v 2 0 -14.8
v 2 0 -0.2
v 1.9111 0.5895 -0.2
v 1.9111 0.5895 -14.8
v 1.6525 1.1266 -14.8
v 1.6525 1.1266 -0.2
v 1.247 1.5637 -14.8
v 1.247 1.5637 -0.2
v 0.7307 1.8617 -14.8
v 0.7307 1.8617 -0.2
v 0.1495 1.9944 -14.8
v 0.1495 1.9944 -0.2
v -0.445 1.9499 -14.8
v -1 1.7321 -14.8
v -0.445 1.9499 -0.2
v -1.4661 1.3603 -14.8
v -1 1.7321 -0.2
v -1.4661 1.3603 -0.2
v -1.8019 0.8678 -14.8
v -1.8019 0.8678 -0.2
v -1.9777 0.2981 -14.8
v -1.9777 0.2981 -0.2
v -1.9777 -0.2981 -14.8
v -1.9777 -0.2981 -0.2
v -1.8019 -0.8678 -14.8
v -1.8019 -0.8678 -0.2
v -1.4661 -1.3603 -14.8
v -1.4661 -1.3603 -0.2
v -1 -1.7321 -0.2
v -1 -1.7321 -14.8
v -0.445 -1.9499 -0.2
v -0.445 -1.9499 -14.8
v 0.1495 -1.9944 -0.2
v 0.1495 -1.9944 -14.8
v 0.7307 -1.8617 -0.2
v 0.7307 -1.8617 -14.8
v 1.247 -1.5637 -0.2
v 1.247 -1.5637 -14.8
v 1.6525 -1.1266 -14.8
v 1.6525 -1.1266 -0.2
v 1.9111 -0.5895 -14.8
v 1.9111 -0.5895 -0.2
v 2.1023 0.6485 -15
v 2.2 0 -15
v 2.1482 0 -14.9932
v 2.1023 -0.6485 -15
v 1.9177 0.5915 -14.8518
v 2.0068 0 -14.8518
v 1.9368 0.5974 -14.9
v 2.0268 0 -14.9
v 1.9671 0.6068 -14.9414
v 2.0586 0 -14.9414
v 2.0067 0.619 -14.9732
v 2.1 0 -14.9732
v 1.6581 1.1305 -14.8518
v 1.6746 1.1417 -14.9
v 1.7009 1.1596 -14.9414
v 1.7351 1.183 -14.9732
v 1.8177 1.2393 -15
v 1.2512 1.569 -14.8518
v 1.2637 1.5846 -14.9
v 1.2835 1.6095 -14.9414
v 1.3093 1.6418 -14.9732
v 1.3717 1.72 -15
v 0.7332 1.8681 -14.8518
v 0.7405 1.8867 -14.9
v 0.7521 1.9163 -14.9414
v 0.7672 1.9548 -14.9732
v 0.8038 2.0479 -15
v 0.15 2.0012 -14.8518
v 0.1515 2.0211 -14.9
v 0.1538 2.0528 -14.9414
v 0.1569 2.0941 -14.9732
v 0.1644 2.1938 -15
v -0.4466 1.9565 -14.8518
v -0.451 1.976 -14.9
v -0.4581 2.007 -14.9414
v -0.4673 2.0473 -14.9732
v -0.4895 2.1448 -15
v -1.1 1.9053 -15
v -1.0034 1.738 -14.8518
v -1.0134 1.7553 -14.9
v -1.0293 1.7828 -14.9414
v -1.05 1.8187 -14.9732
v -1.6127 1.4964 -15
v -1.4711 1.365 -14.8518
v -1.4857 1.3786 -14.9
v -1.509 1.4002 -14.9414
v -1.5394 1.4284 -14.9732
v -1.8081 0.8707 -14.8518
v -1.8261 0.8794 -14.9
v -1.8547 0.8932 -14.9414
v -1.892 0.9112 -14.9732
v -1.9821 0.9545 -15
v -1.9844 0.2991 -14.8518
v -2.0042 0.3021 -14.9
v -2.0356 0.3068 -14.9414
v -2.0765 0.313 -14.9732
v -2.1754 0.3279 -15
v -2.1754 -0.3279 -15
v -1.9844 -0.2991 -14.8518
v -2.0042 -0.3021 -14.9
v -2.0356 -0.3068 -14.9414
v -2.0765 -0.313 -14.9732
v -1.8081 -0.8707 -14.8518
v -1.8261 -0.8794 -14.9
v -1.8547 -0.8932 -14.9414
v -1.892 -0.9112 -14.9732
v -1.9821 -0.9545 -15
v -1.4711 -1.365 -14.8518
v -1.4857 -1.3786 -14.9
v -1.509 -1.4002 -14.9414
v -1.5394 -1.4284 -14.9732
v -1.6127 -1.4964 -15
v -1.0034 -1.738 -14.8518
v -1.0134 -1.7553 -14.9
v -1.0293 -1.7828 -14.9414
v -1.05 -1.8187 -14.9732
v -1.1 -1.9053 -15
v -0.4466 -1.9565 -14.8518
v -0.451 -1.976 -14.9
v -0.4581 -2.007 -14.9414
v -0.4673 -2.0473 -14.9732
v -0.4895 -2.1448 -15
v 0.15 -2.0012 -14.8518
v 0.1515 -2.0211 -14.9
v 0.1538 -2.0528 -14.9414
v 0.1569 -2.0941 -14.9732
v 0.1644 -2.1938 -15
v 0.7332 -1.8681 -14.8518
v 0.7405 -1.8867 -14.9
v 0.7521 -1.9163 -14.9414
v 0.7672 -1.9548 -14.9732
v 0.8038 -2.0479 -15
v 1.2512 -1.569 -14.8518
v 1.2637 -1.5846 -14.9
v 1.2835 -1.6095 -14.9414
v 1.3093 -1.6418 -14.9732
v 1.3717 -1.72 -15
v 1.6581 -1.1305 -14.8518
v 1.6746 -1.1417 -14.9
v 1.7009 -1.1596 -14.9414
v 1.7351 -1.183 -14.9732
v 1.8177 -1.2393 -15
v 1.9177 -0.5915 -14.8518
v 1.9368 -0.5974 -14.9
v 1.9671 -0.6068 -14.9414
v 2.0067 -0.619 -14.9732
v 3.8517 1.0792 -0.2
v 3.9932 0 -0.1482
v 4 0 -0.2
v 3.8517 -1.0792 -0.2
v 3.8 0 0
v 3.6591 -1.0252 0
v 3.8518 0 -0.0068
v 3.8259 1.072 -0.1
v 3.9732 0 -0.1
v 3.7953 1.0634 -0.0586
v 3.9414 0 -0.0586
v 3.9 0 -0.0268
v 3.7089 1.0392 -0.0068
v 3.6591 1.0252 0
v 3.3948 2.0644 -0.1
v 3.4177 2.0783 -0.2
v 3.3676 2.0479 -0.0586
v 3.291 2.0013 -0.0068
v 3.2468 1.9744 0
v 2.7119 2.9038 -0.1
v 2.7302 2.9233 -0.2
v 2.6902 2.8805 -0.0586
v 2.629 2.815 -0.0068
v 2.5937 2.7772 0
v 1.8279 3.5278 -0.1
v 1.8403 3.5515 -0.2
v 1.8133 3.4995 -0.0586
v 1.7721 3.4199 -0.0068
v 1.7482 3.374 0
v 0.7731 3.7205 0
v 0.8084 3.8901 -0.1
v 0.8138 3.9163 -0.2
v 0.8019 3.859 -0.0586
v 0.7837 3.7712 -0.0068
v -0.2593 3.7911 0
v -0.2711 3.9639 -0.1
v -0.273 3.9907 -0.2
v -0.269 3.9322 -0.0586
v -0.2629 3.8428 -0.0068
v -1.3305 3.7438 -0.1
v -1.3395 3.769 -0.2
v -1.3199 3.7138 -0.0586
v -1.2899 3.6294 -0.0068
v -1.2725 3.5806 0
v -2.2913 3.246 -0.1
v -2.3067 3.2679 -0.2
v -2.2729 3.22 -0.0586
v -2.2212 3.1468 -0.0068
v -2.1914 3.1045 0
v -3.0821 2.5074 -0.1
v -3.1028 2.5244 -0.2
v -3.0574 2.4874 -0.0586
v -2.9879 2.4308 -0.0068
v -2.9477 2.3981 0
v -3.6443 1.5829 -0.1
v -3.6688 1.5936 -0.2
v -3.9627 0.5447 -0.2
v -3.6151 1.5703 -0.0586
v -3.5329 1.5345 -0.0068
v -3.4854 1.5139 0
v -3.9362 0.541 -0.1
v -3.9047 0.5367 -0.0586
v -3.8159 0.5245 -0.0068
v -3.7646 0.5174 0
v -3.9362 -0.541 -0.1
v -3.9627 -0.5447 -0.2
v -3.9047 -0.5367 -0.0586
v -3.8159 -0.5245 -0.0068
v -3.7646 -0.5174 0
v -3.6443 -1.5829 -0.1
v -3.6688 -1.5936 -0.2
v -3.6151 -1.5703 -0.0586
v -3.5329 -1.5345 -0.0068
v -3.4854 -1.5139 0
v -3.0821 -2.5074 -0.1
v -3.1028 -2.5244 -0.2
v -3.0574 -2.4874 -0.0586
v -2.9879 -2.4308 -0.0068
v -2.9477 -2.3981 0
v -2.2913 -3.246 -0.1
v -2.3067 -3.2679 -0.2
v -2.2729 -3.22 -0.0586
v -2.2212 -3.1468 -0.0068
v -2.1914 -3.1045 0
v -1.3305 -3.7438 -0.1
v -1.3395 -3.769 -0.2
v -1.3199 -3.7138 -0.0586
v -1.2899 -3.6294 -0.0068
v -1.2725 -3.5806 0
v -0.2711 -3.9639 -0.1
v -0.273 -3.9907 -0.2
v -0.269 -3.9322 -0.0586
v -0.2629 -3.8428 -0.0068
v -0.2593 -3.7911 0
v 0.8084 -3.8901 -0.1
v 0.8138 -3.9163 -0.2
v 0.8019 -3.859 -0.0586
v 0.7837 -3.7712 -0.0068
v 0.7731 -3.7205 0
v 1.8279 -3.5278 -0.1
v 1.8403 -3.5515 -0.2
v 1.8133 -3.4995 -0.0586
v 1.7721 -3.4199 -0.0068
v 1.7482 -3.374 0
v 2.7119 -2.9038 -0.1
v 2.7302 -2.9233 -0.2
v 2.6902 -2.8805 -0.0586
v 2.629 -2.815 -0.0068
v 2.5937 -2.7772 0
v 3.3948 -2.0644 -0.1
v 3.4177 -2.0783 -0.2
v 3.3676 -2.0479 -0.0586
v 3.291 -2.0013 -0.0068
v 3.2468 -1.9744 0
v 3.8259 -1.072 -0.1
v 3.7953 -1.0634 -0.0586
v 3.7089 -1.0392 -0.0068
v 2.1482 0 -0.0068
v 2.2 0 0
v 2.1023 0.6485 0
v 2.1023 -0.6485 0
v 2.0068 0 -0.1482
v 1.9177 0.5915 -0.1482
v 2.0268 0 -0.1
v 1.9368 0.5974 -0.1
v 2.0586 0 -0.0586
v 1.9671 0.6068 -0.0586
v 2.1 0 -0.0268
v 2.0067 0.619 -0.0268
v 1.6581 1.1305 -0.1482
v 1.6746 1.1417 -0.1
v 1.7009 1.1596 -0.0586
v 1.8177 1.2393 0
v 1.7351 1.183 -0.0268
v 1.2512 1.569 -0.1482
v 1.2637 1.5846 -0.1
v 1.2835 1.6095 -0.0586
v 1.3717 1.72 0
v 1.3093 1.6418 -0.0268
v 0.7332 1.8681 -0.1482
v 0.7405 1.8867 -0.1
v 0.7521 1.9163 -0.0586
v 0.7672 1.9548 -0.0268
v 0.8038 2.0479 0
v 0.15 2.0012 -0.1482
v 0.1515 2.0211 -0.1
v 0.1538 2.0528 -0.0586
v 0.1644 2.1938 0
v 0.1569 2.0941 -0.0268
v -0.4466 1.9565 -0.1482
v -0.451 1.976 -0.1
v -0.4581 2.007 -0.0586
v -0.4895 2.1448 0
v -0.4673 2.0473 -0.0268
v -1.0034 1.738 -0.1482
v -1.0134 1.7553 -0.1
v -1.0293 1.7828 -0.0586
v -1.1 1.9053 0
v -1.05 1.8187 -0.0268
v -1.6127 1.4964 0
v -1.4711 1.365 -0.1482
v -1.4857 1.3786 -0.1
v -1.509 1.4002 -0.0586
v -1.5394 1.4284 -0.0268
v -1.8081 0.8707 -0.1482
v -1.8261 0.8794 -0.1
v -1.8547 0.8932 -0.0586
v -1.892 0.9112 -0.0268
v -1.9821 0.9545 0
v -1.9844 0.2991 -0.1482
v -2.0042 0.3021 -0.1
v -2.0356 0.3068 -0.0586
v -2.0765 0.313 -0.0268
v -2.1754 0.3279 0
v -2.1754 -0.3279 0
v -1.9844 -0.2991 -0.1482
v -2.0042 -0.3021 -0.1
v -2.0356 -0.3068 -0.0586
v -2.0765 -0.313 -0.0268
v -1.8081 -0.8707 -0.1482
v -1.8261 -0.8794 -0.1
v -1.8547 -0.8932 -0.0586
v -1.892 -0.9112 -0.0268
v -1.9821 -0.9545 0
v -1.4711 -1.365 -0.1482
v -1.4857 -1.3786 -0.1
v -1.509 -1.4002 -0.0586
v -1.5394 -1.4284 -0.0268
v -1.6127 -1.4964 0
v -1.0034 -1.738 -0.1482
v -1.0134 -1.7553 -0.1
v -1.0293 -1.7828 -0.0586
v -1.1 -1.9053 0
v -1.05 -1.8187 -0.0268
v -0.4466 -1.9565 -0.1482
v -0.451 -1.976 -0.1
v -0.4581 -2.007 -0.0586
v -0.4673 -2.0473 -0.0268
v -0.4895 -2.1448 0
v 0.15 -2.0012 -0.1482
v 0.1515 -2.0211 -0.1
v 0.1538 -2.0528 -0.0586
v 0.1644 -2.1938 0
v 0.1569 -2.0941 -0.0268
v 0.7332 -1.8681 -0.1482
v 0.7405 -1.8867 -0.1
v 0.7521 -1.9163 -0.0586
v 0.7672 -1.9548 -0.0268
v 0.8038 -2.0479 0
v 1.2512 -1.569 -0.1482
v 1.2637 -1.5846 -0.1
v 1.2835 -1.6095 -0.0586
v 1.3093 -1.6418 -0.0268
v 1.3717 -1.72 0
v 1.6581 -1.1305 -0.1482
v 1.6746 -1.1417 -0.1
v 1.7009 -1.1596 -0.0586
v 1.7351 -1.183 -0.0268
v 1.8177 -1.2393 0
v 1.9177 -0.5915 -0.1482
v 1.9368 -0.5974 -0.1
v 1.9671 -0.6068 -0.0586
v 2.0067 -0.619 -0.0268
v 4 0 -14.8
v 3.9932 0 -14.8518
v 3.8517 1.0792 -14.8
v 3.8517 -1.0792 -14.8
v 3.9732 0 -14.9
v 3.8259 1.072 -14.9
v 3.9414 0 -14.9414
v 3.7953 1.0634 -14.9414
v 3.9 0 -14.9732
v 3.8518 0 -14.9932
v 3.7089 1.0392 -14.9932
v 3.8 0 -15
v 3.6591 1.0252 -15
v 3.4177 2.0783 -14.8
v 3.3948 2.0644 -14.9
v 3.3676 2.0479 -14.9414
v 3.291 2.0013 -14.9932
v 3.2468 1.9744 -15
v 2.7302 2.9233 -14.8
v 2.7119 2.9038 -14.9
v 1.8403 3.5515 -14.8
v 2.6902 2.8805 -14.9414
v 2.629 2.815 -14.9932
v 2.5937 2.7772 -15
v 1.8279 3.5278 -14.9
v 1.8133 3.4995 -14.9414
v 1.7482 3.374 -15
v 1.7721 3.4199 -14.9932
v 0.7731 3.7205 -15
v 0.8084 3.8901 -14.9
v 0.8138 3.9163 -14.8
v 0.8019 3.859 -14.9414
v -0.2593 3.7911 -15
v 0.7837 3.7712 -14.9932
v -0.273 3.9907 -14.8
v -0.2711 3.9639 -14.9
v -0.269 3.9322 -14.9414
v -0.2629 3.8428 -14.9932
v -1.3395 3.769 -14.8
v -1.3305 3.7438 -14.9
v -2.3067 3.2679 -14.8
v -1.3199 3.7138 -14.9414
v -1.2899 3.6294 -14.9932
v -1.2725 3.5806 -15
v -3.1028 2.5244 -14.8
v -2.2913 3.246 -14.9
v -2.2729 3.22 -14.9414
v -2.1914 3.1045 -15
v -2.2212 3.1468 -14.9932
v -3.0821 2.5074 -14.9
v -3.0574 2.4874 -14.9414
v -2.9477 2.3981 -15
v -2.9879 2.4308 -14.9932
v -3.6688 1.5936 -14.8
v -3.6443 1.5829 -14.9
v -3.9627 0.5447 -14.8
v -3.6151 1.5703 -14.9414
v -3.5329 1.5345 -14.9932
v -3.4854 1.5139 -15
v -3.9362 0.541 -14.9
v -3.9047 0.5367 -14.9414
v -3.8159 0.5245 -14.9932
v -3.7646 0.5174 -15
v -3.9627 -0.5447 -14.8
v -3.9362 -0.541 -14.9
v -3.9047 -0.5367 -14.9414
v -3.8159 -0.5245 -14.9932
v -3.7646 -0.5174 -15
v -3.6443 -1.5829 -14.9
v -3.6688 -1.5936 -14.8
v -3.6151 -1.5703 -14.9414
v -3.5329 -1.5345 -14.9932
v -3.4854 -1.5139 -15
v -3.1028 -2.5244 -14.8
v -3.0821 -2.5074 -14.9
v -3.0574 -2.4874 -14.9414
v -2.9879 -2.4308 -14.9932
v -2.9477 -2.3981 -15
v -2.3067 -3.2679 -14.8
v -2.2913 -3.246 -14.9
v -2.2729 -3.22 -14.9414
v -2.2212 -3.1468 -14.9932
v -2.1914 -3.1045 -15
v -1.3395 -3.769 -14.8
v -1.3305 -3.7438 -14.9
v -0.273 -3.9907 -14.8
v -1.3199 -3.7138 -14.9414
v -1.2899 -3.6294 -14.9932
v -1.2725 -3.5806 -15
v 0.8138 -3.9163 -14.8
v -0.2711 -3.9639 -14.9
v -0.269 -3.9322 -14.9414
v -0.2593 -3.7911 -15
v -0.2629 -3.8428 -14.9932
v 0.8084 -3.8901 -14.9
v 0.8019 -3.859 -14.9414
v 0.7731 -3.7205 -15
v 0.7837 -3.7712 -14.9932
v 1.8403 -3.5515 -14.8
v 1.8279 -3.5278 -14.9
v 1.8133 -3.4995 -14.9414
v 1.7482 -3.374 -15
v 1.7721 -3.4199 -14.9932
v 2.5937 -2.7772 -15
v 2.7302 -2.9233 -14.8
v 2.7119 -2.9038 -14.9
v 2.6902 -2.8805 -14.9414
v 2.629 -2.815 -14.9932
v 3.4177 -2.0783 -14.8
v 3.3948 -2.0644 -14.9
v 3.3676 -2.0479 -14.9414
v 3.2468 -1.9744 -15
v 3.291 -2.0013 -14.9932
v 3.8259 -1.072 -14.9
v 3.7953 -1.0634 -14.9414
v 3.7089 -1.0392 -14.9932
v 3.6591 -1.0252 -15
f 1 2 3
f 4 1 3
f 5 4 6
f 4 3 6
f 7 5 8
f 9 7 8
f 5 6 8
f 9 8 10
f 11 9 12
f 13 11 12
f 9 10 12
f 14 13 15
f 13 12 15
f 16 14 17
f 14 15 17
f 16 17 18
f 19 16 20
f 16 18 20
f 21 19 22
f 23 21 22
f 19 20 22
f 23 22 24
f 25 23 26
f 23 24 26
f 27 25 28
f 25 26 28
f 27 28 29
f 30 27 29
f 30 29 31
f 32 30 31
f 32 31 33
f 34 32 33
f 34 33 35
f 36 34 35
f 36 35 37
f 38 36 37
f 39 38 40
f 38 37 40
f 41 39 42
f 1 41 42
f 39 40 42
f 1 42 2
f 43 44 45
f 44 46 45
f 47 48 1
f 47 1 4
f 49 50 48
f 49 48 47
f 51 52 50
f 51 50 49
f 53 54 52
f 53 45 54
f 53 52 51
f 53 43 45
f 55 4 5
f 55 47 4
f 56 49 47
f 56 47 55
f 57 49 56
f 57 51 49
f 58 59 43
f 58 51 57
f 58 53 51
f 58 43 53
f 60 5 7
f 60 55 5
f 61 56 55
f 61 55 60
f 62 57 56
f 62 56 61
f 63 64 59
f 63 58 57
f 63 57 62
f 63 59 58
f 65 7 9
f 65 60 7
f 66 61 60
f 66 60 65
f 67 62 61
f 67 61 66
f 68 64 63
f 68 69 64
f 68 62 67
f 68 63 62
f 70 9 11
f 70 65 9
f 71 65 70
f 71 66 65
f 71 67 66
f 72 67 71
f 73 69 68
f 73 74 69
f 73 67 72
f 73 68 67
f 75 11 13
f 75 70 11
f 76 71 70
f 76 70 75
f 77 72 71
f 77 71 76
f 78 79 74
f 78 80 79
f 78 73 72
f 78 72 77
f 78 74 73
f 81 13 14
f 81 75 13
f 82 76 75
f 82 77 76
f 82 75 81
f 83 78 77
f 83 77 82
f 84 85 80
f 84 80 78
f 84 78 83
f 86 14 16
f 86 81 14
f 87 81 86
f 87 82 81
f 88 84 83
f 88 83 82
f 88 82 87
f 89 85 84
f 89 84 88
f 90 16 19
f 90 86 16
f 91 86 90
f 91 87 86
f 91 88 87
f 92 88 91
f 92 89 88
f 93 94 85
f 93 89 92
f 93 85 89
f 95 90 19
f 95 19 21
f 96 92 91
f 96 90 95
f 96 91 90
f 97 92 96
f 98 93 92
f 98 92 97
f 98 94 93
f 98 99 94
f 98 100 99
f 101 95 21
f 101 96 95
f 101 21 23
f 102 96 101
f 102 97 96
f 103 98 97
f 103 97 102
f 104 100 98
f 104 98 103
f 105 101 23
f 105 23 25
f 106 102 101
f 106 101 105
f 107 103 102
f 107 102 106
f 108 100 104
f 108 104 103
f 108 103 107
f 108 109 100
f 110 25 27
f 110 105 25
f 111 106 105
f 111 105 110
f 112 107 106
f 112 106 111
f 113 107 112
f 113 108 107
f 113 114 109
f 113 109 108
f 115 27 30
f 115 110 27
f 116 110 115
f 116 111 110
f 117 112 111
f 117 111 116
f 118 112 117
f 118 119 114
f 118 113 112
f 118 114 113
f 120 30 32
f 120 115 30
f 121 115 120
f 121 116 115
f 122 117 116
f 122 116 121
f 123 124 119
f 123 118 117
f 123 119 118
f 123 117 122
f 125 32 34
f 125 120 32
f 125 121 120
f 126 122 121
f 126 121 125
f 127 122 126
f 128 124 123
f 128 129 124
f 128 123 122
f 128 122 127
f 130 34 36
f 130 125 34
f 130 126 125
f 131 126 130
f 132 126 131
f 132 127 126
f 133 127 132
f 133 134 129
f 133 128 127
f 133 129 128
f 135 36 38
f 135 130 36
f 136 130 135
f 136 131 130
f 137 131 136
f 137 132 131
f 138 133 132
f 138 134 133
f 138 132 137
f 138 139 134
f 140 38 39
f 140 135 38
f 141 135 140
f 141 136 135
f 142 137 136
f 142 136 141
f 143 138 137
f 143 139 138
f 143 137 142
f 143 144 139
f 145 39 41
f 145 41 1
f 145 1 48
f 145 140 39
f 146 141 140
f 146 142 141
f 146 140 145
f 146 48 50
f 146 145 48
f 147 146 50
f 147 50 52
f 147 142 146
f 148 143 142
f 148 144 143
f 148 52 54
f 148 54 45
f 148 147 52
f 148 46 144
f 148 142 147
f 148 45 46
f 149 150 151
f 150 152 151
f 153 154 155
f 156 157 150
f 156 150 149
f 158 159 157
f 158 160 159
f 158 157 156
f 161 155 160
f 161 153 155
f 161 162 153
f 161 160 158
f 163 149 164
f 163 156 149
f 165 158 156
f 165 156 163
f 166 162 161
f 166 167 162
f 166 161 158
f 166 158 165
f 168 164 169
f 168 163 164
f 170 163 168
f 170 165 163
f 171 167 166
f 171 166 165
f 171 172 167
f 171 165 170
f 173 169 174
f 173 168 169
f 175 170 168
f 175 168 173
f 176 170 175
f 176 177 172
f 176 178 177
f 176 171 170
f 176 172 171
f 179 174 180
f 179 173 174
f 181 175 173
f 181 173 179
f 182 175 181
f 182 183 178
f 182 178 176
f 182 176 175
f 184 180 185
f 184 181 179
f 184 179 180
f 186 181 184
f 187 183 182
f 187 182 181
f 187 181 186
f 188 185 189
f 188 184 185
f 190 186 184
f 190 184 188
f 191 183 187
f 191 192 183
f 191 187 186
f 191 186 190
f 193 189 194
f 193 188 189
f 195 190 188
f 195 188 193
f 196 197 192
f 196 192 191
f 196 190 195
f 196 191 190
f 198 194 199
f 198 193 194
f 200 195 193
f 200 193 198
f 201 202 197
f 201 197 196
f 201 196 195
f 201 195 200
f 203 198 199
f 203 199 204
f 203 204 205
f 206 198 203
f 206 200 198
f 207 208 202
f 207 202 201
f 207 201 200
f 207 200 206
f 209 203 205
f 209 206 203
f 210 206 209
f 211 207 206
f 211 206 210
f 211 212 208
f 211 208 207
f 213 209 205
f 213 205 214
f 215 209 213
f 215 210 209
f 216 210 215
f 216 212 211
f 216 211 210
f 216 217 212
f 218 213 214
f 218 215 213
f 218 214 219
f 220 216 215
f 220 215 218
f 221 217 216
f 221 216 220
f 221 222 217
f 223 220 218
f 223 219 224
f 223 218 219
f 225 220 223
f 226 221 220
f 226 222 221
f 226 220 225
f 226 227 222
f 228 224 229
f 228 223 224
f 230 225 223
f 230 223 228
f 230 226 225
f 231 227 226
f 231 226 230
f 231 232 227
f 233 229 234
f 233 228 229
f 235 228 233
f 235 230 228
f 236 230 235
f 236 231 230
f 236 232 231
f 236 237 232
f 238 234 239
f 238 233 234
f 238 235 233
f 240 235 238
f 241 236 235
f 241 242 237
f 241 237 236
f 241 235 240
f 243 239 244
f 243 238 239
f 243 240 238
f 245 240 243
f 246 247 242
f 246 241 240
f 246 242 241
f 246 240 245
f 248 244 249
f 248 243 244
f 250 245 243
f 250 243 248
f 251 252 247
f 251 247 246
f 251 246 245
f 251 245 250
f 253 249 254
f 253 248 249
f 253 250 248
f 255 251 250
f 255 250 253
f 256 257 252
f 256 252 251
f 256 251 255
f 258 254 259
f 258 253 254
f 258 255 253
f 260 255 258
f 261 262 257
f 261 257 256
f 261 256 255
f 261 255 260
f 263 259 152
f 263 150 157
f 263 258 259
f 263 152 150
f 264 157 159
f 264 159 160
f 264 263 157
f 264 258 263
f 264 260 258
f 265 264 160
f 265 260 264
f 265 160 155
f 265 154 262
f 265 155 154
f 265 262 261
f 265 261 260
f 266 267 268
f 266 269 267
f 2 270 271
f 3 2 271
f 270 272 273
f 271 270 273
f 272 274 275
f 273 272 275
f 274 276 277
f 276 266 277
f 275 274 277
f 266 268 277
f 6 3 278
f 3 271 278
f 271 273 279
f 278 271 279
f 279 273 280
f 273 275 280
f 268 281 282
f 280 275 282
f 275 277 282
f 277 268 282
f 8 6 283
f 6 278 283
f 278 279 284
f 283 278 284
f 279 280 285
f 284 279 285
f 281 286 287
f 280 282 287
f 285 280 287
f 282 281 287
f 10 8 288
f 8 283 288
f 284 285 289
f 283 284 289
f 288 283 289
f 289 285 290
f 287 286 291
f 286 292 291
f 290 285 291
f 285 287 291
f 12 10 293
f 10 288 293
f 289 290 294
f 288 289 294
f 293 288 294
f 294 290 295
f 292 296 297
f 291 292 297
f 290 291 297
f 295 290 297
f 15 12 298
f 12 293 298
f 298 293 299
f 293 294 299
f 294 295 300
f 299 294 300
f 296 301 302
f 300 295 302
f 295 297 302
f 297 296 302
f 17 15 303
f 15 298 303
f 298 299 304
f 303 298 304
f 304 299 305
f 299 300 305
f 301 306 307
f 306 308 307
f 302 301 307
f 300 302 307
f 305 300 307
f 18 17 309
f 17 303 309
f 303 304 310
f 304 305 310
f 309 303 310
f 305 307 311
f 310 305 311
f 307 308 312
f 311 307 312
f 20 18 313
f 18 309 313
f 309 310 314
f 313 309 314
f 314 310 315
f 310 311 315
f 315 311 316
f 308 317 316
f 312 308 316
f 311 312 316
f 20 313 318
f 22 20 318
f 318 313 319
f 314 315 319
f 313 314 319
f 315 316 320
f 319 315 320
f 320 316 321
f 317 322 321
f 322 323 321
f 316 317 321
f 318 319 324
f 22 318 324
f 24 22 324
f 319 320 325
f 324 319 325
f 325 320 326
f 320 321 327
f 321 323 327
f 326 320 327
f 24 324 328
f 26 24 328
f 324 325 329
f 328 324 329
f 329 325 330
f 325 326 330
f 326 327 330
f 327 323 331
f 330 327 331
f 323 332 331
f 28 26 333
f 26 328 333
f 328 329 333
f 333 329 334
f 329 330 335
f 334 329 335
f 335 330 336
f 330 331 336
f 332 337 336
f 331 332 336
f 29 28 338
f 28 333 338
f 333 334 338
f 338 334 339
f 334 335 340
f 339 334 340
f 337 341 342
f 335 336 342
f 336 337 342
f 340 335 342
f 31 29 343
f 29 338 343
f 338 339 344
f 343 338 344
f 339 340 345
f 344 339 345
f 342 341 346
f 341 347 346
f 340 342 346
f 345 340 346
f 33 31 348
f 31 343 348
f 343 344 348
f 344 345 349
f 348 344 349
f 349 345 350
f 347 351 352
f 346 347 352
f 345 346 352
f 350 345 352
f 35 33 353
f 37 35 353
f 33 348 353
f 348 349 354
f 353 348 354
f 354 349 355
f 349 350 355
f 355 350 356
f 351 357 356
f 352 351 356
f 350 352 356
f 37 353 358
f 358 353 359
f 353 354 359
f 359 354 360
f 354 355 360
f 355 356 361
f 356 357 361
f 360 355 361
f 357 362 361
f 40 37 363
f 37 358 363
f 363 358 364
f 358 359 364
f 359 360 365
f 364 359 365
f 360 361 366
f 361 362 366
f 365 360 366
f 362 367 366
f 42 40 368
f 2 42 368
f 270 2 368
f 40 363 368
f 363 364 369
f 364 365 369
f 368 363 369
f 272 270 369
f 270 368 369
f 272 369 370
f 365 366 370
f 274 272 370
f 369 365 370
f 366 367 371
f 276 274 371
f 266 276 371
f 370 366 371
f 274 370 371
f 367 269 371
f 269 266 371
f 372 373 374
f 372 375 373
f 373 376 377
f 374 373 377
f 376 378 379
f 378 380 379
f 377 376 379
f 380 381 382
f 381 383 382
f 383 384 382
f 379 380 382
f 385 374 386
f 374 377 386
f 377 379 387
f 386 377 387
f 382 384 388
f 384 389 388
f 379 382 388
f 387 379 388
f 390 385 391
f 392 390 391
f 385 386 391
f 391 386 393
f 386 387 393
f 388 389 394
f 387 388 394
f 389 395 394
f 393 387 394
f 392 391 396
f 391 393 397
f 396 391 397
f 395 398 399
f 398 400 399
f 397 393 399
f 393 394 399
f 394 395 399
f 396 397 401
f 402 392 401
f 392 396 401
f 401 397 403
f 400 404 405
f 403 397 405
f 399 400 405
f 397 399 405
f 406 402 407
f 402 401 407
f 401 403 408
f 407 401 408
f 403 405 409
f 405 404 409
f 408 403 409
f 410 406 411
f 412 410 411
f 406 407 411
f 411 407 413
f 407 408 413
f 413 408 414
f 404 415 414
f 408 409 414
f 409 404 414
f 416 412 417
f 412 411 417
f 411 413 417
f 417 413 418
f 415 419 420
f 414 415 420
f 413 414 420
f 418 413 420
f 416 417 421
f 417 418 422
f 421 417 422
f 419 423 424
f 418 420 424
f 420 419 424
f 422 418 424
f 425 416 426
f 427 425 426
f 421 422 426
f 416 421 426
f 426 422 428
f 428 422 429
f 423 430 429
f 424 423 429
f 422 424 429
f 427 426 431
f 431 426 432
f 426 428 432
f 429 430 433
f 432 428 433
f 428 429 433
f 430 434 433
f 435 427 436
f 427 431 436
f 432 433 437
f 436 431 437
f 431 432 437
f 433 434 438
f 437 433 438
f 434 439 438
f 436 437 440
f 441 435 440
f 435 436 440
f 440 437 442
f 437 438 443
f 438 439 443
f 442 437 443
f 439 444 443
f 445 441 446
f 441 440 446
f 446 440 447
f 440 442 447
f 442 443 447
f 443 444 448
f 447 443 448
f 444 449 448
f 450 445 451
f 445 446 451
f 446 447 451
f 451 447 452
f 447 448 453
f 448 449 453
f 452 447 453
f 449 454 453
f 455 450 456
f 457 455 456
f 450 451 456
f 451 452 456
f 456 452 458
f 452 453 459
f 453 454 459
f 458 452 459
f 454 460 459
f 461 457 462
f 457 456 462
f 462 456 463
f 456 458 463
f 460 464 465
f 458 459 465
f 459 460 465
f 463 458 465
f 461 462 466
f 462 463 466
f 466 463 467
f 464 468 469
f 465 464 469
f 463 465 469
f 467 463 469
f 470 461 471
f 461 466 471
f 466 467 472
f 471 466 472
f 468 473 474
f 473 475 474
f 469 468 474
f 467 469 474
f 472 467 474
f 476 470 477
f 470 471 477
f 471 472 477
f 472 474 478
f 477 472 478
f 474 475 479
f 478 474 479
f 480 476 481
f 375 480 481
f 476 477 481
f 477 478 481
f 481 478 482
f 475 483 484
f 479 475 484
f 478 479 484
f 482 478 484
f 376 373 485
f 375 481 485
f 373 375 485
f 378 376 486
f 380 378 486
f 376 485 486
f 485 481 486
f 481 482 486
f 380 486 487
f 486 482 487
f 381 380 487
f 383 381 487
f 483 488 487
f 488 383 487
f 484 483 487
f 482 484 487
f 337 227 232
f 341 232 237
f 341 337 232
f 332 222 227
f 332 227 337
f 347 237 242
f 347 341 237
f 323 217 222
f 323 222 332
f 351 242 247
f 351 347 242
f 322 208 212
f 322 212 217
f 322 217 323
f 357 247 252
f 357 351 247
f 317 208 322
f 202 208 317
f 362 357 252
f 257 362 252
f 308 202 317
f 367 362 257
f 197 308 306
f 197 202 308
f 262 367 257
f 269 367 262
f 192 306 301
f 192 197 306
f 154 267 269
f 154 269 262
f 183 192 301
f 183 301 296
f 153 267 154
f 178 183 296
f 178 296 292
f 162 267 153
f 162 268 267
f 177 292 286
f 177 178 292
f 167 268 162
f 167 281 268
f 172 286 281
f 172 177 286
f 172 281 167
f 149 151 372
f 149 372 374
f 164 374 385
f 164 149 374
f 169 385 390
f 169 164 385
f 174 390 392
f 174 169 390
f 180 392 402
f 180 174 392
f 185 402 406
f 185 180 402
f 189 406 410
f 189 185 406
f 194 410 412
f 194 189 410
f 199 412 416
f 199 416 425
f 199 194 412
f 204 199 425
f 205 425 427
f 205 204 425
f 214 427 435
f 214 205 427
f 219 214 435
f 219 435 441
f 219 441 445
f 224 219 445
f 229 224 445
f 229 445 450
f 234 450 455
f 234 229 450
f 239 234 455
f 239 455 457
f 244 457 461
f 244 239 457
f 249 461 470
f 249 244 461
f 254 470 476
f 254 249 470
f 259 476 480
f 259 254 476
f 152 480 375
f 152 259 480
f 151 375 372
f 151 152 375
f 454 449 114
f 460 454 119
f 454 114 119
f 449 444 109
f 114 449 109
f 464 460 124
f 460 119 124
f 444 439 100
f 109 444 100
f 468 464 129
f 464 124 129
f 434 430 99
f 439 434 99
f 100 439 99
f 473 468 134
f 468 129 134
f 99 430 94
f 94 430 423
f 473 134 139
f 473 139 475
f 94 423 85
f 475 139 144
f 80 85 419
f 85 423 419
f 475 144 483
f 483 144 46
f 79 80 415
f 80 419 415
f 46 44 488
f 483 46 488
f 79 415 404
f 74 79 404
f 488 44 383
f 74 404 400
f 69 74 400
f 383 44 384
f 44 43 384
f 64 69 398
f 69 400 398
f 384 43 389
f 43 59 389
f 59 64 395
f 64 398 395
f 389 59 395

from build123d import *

# Parameters (mm, degrees)
SKETCH_1_R      = 4
SKETCH_1_R_2    = 2
EXTRUDE_1_DEPTH = 15
FILLET_1_R      = 0.2


with BuildPart() as part:
    # 草图1 → 凸台-拉伸1 (new body)
    with BuildSketch(Plane.XY):
        Circle(SKETCH_1_R)
        Circle(SKETCH_1_R_2, mode=Mode.SUBTRACT)
    extrude(amount=-EXTRUDE_1_DEPTH)

    # 圆角1
    fillet_1_edges = [part.edges().sort_by_distance(p)[0] for p in [
        (-4, 0, 0),
        (-4, 0, -15),
        (-2, 0, -15),
        (-2, 0, 0),
    ]]
    fillet(fillet_1_edges, radius=FILLET_1_R)


solid = part.part
